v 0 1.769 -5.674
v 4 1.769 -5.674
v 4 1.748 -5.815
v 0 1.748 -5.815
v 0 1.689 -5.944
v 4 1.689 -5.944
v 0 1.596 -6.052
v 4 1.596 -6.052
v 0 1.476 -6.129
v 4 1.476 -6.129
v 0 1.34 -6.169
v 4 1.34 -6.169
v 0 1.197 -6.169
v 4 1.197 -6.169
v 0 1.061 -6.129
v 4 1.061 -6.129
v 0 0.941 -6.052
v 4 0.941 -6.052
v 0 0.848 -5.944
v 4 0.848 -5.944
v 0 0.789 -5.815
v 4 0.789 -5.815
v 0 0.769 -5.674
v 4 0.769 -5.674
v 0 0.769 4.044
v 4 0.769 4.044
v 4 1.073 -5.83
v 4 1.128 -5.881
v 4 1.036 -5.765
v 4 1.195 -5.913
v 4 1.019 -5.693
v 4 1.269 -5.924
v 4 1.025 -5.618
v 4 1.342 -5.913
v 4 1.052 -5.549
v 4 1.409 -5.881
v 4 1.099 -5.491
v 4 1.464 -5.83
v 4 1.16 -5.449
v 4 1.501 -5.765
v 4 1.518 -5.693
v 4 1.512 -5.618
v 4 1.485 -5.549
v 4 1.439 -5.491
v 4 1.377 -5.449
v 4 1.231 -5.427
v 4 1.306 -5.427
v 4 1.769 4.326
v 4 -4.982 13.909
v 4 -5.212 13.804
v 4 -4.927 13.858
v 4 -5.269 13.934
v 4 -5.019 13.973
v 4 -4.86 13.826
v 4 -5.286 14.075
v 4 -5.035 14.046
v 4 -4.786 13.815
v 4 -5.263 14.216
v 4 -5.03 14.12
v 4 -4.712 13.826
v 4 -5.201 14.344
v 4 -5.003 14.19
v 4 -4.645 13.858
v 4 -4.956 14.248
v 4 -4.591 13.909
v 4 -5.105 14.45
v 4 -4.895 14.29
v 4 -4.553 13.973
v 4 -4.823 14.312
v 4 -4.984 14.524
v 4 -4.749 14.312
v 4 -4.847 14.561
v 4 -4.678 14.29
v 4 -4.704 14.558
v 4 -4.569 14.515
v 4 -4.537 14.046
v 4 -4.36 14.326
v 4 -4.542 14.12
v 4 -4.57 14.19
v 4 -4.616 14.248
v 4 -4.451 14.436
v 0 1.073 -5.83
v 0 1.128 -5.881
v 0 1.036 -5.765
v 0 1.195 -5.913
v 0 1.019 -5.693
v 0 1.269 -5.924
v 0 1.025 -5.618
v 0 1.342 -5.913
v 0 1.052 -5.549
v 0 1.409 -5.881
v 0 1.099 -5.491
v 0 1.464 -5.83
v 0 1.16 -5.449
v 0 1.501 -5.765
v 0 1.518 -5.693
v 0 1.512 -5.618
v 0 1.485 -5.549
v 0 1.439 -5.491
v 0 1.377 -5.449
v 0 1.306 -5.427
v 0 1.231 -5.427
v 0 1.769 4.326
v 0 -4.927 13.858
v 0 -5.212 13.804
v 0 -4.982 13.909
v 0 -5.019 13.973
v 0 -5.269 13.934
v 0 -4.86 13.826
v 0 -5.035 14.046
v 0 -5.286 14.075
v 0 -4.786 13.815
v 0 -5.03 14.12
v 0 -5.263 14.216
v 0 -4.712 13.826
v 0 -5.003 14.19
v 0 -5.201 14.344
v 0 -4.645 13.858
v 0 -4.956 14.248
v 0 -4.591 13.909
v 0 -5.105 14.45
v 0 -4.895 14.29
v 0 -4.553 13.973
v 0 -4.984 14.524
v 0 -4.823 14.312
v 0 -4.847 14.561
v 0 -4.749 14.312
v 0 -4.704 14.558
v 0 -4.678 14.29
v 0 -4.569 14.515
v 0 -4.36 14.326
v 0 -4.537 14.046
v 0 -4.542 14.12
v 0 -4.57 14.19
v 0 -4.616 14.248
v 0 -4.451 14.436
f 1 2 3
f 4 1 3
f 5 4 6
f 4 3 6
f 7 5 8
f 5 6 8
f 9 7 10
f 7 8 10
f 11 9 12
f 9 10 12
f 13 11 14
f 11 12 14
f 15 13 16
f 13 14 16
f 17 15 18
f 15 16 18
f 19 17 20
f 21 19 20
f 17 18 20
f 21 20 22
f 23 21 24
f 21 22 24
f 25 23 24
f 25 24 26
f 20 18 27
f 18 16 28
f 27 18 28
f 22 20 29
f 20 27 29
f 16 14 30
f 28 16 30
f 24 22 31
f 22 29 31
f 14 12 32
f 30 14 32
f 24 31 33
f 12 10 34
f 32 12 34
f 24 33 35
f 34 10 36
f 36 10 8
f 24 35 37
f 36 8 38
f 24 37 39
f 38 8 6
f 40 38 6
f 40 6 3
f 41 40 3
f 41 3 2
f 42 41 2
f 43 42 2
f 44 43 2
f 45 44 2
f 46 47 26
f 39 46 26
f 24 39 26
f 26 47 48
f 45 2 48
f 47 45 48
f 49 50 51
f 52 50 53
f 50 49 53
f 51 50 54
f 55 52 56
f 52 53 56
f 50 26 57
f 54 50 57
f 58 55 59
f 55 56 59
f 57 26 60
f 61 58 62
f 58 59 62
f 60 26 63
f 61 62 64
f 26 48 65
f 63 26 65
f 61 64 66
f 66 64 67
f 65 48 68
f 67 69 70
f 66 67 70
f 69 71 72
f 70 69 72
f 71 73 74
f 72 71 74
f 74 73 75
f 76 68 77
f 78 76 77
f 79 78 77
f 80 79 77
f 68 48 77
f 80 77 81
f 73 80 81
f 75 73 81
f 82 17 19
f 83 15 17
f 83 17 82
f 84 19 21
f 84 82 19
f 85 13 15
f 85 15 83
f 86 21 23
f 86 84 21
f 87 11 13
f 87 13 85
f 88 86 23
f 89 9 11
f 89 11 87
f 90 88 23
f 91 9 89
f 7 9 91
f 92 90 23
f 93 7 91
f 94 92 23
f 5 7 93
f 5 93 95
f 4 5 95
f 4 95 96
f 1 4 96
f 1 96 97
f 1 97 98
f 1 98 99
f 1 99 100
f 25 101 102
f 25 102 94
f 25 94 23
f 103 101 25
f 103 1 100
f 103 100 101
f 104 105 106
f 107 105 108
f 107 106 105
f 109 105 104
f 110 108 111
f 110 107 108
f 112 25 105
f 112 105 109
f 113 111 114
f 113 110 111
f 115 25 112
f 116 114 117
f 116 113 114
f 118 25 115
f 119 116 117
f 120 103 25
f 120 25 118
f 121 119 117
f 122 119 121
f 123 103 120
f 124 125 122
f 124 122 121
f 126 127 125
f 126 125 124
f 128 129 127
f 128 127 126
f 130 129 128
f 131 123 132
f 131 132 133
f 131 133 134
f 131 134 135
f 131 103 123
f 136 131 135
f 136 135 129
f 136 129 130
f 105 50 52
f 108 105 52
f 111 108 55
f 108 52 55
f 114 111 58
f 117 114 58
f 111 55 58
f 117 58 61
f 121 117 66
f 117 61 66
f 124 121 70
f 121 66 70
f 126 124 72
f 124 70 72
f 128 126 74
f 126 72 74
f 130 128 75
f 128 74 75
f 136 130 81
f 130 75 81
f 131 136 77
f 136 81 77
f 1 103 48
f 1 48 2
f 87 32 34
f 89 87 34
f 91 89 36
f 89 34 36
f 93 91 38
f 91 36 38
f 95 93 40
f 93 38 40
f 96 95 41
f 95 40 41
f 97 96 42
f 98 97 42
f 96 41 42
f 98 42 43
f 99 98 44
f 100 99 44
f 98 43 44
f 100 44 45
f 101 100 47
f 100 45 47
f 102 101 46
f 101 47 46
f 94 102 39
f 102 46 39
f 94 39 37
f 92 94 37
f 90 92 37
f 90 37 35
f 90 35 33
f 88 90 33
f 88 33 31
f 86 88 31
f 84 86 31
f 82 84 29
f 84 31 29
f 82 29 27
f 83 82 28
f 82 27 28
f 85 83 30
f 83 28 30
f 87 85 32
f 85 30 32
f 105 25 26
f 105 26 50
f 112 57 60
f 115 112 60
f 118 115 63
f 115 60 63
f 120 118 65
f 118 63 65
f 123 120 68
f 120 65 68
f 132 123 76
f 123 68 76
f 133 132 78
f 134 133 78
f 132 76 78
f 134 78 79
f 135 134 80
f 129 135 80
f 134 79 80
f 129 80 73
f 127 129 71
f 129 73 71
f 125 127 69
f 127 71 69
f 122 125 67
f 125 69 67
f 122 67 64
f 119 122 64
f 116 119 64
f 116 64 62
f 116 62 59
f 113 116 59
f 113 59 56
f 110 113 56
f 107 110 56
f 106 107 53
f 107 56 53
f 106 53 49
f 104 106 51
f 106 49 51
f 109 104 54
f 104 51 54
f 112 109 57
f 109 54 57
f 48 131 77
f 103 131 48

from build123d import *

# Parameters (mm, degrees)
EXTRUDE_2_DEPTH     = 4
EXTRUDE_3_DEPTH     = 4
SKETCH_3_R          = 0.25
CUT_EXTRUDE_1_DEPTH = 4


with BuildPart() as part:
    # 草图1 → 凸台-拉伸2 (new body)
    with BuildSketch(Plane(origin=(0, 0, 0), x_dir=(0, 0, -1), z_dir=(1, 0, 0))):
        Polygon((-4.326044833, 1.768613288), (5.673955167, 1.768613288), (5.673955167, 0.768613288), (-4.04400015, 0.768613288), (-13.803521761, -5.212415113), (-14.326044833, -4.359789967), align=None)
    extrude(amount=EXTRUDE_2_DEPTH)

    # 草图2 → 凸台-拉伸3 (add)
    with BuildSketch(Plane(origin=(4, 0, 0), x_dir=(0, 0, -1), z_dir=(1, 0, 0))):
        with BuildLine():
            Line((5.673955167, 0.768613288), (5.673955167, 1.768613288))
            ThreePointArc((5.673955167, 1.768613288), (6.173955167, 1.268613288), (5.673955167, 0.768613288))
        make_face()
        with BuildLine():
            Line((-14.326044833, -4.359789967), (-13.803521761, -5.212415113))
            ThreePointArc((-13.803521761, -5.212415113), (-14.49109587, -5.047364076), (-14.326044833, -4.359789967))
        make_face()
    extrude(amount=-EXTRUDE_3_DEPTH)

    # 草图3 → 切除-拉伸1 (cut)
    with BuildSketch(Plane(origin=(4, 0, 0), x_dir=(0, 0, -1), z_dir=(1, 0, 0))):
        with Locations((-14.064783297, -4.78610254)):
            Circle(SKETCH_3_R)
        with Locations((5.673955167, 1.268613288)):
            Circle(SKETCH_3_R)
    extrude(amount=-CUT_EXTRUDE_1_DEPTH, mode=Mode.SUBTRACT)


solid = part.part
